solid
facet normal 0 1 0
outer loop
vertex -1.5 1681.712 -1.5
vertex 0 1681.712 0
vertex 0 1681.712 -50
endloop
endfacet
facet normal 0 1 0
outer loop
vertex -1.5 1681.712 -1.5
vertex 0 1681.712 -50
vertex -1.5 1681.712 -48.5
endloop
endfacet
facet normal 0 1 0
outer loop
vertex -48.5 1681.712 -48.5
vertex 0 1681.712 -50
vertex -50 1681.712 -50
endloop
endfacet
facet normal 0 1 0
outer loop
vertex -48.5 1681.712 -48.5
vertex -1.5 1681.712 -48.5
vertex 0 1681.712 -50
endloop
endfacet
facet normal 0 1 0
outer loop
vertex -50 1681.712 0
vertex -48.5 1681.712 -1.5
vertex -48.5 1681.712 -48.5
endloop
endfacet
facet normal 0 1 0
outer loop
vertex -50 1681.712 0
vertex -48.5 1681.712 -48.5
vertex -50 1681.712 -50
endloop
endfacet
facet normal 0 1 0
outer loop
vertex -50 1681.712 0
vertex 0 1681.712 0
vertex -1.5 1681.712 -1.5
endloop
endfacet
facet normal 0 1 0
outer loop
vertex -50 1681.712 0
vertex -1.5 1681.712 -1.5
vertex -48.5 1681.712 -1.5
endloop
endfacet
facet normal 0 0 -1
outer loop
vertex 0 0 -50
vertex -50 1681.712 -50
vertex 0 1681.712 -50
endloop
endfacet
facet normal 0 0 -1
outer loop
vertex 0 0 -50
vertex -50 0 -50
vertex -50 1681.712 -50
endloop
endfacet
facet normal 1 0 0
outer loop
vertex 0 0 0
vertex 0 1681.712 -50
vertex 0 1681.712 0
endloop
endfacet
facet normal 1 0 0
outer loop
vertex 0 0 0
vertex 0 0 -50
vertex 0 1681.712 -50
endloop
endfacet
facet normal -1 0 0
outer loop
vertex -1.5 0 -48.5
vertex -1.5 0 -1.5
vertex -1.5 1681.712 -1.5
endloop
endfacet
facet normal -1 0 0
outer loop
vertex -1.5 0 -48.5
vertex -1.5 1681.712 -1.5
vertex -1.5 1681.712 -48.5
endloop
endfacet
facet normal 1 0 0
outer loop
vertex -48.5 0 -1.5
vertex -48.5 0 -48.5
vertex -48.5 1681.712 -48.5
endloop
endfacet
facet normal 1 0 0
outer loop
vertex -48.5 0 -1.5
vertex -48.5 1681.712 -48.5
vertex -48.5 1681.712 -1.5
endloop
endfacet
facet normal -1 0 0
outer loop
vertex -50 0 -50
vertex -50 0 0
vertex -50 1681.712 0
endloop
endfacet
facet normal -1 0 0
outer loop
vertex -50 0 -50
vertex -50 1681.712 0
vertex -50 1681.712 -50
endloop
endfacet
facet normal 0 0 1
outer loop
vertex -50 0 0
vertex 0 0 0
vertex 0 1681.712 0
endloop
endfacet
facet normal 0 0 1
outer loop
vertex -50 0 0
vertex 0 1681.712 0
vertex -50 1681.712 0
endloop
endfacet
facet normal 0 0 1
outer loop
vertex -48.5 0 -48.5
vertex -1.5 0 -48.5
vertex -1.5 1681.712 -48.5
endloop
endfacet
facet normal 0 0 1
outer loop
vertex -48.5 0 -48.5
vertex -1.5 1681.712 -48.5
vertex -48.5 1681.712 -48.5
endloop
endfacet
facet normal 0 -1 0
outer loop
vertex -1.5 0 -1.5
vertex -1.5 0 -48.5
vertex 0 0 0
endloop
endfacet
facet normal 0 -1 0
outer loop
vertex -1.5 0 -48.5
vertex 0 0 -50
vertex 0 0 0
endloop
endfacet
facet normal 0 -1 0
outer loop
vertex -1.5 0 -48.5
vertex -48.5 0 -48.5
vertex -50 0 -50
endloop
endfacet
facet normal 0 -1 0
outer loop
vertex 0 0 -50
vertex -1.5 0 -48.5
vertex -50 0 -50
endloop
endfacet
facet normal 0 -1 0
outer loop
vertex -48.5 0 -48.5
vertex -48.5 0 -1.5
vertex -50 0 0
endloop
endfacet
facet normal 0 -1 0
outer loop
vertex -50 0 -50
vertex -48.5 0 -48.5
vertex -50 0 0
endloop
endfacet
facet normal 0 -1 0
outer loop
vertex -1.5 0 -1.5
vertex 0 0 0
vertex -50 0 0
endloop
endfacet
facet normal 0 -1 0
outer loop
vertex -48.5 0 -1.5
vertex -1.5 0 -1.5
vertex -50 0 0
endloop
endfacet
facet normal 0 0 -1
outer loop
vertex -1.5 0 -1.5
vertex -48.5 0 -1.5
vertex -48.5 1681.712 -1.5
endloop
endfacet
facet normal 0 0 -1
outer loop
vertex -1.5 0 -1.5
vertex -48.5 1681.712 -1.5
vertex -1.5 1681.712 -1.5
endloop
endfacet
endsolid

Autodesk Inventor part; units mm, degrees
ref_plane "YZ Plane" through (0, 0, 0) normal (1, 0, 0) x (0, 1, 0)
ref_plane "XZ Plane" through (0, 0, 0) normal (0, 1, 0) x (-1, 0, 0)
ref_plane "XY Plane" through (0, 0, 0) normal (0, 0, 1) x (1, 0, 0)
sketch "Boceto1" plane through (0, 0, 0) normal (0, 1, 0) x (-1, 0, 0)
  line L0 (0, 0) -> (50, 0)
  line L1 (50, 0) -> (50, -50)
  line L2 (50, -50) -> (0, -50)
  line L3 (0, -50) -> (0, 0)
  line L4 (1.5, -48.5) -> (48.5, -48.5)
  line L5 (48.5, -48.5) -> (48.5, -1.5)
  line L6 (48.5, -1.5) -> (1.5, -1.5)
  line L7 (1.5, -1.5) -> (1.5, -48.5)
  line L8 (1.5, -48.5) -> (48.5, -1.5) construction
  line L9 (48.5, -48.5) -> (1.5, -1.5) construction
  point P0 (25, -25)
  dimension "d0" = 50
  dimension "d1" = 50
  dimension "d6" = 1.5
  dimension "d7" = 1.5
  dimension "d8" = 1.5
  dimension "d9" = 1.5
extrude "Extrusión1" add sketch "Boceto1" along normal blind 1681.712
equation "\"d0\" = d1"
equation "\"d7\" = d6"
equation "\"d8\" = d6"
equation "\"d9\" = d6"
properties part number "Mesa_soporte2"
